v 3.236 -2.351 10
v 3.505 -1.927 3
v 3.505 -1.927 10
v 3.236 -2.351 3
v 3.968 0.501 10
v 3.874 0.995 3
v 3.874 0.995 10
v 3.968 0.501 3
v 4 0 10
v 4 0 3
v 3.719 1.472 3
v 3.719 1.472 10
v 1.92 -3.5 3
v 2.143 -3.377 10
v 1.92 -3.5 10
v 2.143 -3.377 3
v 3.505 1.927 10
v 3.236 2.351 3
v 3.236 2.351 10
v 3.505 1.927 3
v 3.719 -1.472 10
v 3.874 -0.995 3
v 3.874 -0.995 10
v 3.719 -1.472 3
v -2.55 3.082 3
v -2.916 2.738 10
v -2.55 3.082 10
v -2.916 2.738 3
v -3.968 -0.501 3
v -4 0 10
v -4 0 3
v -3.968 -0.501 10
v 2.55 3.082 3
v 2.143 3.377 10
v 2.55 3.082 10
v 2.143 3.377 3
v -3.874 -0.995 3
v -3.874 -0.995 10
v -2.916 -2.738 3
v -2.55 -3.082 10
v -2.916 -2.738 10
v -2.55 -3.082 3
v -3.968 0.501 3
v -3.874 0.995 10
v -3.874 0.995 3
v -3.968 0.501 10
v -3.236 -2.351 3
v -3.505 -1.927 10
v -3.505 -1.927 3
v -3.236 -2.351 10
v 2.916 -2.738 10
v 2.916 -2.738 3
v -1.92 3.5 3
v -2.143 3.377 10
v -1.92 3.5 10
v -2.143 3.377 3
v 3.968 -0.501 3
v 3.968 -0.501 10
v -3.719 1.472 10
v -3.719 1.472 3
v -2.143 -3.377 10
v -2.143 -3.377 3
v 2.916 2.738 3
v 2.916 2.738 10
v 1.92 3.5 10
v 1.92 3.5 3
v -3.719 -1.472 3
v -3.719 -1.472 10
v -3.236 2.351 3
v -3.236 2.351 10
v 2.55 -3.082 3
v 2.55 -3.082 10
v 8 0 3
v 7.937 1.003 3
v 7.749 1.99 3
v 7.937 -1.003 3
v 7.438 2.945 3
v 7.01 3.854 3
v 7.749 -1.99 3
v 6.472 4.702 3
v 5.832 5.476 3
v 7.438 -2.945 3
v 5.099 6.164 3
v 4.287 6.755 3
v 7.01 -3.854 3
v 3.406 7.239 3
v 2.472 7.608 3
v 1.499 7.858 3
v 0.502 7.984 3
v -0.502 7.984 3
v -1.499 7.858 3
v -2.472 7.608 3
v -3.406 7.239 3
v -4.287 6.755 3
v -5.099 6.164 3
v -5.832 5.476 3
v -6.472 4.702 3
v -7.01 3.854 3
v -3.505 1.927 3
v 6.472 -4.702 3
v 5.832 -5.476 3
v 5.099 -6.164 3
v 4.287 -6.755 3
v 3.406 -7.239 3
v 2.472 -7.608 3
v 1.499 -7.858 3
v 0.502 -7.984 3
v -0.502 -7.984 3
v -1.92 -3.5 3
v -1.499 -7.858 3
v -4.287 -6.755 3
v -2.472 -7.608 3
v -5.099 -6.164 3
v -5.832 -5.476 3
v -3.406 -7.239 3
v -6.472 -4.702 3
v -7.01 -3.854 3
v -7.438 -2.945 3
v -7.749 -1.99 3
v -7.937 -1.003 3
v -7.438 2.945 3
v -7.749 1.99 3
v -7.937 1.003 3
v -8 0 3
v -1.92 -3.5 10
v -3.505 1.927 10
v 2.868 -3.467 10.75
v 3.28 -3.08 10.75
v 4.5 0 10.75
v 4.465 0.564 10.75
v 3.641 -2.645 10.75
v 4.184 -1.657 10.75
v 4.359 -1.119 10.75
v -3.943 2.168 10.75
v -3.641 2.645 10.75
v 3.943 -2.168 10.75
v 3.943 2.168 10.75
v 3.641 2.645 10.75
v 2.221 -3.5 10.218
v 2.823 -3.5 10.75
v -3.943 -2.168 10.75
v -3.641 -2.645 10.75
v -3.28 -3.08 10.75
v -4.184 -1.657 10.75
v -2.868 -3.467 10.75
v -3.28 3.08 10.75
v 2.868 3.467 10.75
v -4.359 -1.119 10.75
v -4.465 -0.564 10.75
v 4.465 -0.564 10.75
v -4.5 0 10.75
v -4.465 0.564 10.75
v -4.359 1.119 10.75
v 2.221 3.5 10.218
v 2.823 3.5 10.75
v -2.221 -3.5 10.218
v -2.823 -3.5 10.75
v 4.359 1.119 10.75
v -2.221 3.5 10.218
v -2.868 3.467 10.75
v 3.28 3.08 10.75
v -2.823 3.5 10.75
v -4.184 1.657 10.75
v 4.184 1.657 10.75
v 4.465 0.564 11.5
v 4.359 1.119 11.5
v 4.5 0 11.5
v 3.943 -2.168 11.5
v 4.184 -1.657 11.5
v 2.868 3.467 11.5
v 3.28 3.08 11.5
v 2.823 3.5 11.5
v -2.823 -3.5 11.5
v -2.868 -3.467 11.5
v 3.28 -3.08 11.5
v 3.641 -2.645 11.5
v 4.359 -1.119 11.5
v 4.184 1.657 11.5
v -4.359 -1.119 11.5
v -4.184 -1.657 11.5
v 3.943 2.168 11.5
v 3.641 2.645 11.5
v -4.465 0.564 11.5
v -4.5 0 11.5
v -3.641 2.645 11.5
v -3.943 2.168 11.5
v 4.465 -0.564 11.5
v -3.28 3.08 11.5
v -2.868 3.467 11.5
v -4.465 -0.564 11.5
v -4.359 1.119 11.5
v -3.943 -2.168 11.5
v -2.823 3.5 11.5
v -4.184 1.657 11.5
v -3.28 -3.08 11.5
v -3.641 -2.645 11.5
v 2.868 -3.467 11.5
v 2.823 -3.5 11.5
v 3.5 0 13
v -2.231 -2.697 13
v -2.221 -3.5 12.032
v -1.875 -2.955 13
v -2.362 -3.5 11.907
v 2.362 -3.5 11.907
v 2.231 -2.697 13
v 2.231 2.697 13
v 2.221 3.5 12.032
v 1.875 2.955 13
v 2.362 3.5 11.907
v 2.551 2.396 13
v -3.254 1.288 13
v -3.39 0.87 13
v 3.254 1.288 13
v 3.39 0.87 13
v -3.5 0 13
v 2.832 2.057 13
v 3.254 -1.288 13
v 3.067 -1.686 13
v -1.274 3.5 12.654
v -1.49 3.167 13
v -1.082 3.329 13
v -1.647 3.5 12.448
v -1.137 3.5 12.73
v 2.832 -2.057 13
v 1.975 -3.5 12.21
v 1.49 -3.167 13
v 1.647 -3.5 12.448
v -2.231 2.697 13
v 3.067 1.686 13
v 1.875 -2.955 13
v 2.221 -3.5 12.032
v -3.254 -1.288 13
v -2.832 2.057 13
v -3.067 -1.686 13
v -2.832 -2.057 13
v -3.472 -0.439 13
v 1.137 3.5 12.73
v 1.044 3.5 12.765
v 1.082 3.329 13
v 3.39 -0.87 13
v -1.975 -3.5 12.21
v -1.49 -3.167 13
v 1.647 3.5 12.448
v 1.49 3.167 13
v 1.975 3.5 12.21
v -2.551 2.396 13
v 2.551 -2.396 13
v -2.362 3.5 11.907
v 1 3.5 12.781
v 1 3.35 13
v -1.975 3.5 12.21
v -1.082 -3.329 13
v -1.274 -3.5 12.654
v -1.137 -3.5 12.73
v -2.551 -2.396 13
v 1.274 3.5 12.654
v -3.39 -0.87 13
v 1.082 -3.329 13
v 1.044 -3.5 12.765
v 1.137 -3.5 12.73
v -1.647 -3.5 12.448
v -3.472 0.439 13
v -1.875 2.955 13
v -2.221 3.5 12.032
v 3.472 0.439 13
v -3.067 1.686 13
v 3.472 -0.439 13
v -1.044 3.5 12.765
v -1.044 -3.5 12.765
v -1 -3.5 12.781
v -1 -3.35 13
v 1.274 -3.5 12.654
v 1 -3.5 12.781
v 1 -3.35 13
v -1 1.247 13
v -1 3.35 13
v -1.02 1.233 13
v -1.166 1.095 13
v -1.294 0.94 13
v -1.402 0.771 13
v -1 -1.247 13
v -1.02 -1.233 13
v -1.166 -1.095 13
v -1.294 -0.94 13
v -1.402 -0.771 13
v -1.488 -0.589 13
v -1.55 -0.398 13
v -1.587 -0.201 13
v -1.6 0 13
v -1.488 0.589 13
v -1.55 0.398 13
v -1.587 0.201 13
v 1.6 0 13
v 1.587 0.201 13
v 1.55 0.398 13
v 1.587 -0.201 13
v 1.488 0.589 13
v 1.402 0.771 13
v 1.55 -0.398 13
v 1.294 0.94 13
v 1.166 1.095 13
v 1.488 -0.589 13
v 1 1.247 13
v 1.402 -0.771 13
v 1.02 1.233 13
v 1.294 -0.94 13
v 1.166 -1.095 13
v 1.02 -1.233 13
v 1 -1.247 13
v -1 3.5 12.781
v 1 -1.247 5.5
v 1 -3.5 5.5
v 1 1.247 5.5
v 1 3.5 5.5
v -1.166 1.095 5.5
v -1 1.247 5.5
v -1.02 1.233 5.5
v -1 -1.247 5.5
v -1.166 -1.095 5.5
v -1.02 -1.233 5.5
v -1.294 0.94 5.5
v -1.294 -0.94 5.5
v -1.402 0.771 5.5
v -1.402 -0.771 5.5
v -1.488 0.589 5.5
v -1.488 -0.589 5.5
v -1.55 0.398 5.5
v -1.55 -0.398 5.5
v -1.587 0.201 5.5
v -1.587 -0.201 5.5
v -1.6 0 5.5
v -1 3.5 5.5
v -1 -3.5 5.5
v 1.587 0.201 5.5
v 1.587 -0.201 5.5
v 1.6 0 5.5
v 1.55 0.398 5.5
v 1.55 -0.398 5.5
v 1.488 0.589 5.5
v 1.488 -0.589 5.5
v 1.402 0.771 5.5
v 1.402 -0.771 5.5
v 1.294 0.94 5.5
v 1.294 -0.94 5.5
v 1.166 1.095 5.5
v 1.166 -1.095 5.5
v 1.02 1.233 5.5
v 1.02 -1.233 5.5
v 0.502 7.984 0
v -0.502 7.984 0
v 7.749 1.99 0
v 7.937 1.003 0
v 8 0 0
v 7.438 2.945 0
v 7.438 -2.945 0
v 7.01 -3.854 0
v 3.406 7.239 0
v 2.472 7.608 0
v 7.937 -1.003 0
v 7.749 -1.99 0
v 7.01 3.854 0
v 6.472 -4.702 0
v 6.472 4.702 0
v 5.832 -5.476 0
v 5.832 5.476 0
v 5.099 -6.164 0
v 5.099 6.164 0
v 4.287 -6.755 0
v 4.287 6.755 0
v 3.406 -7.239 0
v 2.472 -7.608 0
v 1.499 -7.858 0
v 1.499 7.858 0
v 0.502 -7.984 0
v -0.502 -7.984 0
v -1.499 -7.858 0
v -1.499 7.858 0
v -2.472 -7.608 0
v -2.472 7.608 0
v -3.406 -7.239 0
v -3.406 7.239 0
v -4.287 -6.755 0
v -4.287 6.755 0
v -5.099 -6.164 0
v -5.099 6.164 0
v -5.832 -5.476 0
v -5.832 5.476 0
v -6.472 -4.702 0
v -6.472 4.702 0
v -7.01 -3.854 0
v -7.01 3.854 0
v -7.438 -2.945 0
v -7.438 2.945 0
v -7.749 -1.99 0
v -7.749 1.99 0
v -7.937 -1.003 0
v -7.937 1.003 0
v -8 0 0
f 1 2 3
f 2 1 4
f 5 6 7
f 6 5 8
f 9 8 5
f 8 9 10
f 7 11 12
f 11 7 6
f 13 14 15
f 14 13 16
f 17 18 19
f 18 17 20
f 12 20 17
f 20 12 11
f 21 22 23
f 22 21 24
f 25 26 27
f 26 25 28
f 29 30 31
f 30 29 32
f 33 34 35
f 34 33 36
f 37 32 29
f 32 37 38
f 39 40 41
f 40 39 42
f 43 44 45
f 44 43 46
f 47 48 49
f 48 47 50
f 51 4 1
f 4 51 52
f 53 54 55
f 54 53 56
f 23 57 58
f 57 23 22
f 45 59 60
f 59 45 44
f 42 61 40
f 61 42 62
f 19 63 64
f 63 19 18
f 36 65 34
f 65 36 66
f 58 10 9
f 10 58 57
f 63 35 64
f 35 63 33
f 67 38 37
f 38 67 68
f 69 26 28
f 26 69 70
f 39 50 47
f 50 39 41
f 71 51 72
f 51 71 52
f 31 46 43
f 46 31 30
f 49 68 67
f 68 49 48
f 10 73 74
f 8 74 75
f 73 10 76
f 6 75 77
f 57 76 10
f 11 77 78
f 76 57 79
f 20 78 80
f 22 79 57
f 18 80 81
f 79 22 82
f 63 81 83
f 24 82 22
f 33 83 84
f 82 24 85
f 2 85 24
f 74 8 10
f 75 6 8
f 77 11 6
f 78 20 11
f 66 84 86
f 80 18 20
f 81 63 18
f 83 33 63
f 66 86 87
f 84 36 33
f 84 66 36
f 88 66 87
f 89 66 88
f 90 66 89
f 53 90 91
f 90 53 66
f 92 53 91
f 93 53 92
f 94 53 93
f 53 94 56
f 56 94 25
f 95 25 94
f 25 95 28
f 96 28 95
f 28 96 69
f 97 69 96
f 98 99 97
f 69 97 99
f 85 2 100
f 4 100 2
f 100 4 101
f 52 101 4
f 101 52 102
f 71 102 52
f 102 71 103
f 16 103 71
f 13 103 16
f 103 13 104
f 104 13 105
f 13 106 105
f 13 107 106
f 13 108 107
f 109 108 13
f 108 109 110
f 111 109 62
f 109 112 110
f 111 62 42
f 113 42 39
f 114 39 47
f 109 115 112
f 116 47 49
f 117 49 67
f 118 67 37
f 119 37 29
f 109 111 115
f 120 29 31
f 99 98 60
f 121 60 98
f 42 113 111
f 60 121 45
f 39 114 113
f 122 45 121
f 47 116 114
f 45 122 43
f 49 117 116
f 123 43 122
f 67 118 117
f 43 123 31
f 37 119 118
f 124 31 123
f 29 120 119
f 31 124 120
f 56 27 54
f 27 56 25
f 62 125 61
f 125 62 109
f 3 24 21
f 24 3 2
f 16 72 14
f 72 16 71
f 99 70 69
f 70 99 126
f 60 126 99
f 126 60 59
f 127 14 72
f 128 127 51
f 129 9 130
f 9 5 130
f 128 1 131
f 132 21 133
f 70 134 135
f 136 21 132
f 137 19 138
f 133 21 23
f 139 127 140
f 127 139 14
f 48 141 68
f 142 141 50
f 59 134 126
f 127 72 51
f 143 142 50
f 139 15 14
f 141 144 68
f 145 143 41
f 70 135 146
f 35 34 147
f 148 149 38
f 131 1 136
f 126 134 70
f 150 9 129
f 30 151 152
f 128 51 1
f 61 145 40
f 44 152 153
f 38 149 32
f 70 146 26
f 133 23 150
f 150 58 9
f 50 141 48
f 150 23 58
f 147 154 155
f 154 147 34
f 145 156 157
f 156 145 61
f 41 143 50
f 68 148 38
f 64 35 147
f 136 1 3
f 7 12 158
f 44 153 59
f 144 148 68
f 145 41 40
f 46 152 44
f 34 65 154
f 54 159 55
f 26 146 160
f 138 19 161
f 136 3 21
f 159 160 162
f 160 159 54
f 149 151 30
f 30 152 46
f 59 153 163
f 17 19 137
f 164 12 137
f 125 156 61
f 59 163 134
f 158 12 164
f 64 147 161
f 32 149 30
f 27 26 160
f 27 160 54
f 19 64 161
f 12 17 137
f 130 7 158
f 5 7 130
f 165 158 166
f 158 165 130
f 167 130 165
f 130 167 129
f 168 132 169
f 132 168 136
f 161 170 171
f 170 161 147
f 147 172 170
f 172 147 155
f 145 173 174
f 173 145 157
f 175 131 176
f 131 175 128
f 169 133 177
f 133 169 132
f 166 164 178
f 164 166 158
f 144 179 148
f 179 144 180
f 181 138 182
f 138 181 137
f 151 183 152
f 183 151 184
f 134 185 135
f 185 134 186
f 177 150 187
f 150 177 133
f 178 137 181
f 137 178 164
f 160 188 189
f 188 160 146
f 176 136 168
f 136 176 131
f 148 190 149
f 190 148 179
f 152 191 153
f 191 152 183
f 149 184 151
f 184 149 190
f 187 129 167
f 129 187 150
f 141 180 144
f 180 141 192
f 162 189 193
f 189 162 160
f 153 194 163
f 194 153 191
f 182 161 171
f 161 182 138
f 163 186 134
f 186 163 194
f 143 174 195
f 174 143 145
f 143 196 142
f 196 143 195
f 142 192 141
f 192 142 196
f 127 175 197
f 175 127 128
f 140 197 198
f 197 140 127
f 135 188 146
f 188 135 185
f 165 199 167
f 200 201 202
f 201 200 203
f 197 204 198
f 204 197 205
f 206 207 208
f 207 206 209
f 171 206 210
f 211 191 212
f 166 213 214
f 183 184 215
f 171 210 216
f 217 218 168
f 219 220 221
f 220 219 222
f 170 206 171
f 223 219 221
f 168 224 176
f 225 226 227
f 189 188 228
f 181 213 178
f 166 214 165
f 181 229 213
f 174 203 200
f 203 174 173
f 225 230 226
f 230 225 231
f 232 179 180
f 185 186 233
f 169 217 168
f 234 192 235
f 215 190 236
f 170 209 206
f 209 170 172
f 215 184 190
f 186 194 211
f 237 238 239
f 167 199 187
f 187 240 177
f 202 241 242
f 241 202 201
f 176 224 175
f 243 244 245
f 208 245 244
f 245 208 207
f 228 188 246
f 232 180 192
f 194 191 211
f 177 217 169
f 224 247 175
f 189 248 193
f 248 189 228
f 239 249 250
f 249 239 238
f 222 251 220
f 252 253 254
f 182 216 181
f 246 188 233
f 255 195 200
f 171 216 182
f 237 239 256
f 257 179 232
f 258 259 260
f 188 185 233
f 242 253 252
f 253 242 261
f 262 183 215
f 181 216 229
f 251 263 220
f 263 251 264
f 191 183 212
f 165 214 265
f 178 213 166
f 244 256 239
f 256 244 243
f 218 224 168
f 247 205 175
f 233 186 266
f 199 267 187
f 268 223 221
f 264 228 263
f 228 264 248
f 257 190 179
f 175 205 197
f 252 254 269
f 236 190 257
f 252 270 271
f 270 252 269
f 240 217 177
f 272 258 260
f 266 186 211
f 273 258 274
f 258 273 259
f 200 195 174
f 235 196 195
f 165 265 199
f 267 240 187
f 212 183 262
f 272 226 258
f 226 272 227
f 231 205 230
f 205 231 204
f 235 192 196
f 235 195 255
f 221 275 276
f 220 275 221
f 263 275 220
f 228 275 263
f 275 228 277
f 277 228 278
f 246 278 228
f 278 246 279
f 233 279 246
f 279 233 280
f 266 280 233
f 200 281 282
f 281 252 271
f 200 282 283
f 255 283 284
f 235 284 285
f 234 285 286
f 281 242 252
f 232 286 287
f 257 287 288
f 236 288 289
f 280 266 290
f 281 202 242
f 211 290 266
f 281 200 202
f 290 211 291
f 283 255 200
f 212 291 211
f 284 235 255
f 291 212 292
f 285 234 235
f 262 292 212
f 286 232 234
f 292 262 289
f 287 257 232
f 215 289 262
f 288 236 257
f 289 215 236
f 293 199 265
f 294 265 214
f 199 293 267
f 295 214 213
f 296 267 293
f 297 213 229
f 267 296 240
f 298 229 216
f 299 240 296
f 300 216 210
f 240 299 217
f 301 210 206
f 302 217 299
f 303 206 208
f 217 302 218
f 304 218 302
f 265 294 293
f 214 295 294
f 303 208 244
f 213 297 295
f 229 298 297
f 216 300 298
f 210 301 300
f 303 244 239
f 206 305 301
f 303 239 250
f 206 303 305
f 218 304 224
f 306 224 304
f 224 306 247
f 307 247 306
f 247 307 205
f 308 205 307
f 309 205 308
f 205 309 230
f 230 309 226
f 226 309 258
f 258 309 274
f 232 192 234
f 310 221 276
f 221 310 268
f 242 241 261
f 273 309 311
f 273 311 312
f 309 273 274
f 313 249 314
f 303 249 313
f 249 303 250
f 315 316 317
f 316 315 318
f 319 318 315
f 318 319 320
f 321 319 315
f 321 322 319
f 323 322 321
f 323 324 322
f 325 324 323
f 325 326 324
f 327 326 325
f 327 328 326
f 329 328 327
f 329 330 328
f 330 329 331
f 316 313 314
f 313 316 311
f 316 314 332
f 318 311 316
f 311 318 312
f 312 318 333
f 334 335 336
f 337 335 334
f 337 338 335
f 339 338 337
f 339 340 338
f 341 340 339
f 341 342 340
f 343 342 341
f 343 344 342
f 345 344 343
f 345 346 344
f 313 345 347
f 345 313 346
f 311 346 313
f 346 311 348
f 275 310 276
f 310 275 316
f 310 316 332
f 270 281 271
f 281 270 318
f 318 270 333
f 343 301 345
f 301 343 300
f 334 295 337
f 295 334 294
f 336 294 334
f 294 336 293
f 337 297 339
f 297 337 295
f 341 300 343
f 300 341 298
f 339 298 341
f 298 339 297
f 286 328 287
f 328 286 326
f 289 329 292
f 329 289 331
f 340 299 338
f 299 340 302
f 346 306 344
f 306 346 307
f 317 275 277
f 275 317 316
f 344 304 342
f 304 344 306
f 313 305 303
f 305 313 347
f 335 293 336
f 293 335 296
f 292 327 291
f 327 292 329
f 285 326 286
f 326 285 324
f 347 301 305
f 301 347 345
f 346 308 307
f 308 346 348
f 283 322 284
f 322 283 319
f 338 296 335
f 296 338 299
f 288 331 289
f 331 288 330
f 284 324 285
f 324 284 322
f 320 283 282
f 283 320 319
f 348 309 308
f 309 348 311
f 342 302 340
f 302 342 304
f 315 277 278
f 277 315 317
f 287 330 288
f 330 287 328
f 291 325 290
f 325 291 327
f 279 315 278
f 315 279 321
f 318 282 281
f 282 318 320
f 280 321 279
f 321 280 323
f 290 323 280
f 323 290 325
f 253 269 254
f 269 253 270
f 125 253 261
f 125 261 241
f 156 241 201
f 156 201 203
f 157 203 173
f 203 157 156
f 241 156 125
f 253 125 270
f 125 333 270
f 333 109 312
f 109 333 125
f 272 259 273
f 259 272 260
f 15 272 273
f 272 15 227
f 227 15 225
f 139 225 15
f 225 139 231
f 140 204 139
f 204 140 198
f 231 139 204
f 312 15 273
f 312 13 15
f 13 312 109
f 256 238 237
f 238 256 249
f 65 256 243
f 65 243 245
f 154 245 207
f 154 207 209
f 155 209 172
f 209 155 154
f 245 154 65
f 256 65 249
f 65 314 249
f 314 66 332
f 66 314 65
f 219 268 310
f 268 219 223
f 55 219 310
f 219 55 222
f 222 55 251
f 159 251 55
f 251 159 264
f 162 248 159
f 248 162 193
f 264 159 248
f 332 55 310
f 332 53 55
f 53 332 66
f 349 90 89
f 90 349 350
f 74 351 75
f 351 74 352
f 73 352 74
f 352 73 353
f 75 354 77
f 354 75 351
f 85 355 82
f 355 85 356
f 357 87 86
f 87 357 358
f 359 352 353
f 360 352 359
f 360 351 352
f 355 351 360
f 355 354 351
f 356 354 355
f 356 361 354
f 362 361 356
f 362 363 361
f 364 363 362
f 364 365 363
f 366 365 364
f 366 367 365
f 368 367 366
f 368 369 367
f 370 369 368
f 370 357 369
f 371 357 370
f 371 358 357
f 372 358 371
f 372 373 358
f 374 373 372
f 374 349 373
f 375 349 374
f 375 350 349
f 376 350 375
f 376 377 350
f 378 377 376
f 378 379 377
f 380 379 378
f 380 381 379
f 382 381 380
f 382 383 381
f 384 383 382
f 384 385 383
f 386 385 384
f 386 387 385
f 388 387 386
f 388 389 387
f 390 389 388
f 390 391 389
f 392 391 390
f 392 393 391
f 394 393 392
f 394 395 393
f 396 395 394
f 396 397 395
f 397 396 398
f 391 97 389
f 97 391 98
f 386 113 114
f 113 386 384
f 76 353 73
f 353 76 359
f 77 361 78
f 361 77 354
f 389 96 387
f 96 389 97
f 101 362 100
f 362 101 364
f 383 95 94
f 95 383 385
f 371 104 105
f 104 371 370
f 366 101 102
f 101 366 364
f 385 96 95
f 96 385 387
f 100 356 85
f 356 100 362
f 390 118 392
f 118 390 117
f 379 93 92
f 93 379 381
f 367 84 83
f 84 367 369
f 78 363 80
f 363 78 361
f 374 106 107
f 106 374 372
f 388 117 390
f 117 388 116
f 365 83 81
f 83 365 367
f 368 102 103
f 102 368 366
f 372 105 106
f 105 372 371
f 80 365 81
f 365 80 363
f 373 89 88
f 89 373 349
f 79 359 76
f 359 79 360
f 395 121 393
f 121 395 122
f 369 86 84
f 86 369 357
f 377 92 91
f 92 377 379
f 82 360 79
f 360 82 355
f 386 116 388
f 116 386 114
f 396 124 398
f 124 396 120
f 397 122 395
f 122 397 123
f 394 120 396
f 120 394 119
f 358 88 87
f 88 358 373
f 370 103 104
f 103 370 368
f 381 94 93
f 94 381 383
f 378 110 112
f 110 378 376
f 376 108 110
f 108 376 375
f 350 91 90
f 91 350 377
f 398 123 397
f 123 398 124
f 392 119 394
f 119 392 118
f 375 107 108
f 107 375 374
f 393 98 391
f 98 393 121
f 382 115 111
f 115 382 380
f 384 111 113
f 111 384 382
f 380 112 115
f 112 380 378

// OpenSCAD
// file: ../../lib/joint/joint_pin.scad
// Pin Connectors V2
// Tony Buser <tbuser@gmail.com>

//pin_tack(h=10);

module pin_simple(h=10, r=4, bh=3, br=8) {
  // bh = base_height
  // br = base_radius

  union() {
    cylinder(h=bh, r=br, $fn=50);
    translate([0, 0, bh]) cylinder(h=h, r=r, $fn=50);
  }
}

module pin_tack(h=10, r=4, lh=3, lt=1, bh=3, br=4) {
  // bh = base_height
  // br = base_radius
  
  union() {
    cylinder(h=bh, r=br, $fn=50);
    translate([0, 0, bh]) pin(h, r, lh, lt);
  }
}
// just call pin instead, I made this module because it was easier to do the rotation option this way
// since openscad complains of recursion if I did it all in one module
module pin(h=10, r=4, lh=3, lt=1) {
  // h = shaft height
  // r = shaft radius
  // lh = lip height
  // lt = lip thickness

  difference() {
    pin_solid(h, r, lh, lt);
    
    // center cut
    translate([-r*0.5/2, -(r*2+lt*2)/2, h/4]) cube([r*0.5, r*2+lt*2, h]);
    translate([0, 0, h/4]) cylinder(h=h+lh, r=r/2.5, $fn=50);
    // center curve
    // translate([0, 0, h/4]) rotate([90, 0, 0]) cylinder(h=r*2, r=r*0.5/2, center=true, $fn=50);
  
    // side cuts
    translate([-r*2, -lt-r*1.125, -1]) cube([r*4, lt*2, h+2]);
    translate([-r*2, -lt+r*1.125, -1]) cube([r*4, lt*2, h+2]);
  }
}

// this is mainly to make the pinhole module easier
module pin_solid(h=10, r=4, lh=3, lt=1) {
  union() {
    // shaft
    cylinder(h=h-lh, r=r, $fn=50);
    // lip
    // translate([0, 0, h-lh]) cylinder(h=lh*0.25, r1=r, r2=r+(lt/2), $fn=30);
    // translate([0, 0, h-lh+lh*0.25]) cylinder(h=lh*0.25, r2=r, r1=r+(lt/2), $fn=30);
    // translate([0, 0, h-lh+lh*0.50]) cylinder(h=lh*0.50, r1=r, r2=r-(lt/2), $fn=30);

    // translate([0, 0, h-lh]) cylinder(h=lh*0.50, r1=r, r2=r+(lt/2), $fn=30);
    // translate([0, 0, h-lh+lh*0.50]) cylinder(h=lh*0.50, r1=r+(lt/2), r2=r-(lt/3), $fn=30);    

    translate([0, 0, h-lh]) cylinder(h=lh*0.25, r1=r, r2=r+(lt/2), $fn=50);
    translate([0, 0, h-lh+lh*0.25]) cylinder(h=lh*0.25, r=r+(lt/2), $fn=50);    
    translate([0, 0, h-lh+lh*0.50]) cylinder(h=lh*0.50, r1=r+(lt/2), r2=r-(lt/2), $fn=50);

    // translate([0, 0, h-lh]) cylinder(h=lh, r1=r+(lt/2), r2=1, $fn=30);
    // translate([0, 0, h-lh-lt/2]) cylinder(h=lt/2, r1=r, r2=r+(lt/2), $fn=30);
  }
}
// file: ../../lib/material.scad
module gray() {
	color([.4, .4, .4]) children([0:$children-1]);
}

module black() {
	color([.3, .3, .3]) children([0:$children-1]);
}

module orange() {
	color([1, .7, 0]) children([0:$children-1]);
}

module yellow() {
	color([.7, .7, .3]) children([0:$children-1]);
}

module green_pcb() {
	color([.0, .5, .25]) children([0:$children-1]);
}

module metal() {
	color([.7, .7, .7]) children([0:$children-1]);
}

module gold() {
	color([.8, .5, .0]) children([0:$children-1]);
}

module stainless(no="1.4301") {
	color([0.45, 0.43, 0.5]) children([0:$children-1]);
}

module steel(no) {
	color([0.65, 0.67, 0.72]) children([0:$children-1]);
}

module iron(no="ST37") {
	color([0.36, 0.33, 0.33]) children([0:$children-1]);
}

module plastic() {
	color([1, .7, 0]) children([0:$children-1]);
}
// main file
include <../../lib/material.scad>;
include <../../lib/joint/joint_pin.scad>;

plastic() {
  pin_tack(h=10,bh=3, br=8);
}
